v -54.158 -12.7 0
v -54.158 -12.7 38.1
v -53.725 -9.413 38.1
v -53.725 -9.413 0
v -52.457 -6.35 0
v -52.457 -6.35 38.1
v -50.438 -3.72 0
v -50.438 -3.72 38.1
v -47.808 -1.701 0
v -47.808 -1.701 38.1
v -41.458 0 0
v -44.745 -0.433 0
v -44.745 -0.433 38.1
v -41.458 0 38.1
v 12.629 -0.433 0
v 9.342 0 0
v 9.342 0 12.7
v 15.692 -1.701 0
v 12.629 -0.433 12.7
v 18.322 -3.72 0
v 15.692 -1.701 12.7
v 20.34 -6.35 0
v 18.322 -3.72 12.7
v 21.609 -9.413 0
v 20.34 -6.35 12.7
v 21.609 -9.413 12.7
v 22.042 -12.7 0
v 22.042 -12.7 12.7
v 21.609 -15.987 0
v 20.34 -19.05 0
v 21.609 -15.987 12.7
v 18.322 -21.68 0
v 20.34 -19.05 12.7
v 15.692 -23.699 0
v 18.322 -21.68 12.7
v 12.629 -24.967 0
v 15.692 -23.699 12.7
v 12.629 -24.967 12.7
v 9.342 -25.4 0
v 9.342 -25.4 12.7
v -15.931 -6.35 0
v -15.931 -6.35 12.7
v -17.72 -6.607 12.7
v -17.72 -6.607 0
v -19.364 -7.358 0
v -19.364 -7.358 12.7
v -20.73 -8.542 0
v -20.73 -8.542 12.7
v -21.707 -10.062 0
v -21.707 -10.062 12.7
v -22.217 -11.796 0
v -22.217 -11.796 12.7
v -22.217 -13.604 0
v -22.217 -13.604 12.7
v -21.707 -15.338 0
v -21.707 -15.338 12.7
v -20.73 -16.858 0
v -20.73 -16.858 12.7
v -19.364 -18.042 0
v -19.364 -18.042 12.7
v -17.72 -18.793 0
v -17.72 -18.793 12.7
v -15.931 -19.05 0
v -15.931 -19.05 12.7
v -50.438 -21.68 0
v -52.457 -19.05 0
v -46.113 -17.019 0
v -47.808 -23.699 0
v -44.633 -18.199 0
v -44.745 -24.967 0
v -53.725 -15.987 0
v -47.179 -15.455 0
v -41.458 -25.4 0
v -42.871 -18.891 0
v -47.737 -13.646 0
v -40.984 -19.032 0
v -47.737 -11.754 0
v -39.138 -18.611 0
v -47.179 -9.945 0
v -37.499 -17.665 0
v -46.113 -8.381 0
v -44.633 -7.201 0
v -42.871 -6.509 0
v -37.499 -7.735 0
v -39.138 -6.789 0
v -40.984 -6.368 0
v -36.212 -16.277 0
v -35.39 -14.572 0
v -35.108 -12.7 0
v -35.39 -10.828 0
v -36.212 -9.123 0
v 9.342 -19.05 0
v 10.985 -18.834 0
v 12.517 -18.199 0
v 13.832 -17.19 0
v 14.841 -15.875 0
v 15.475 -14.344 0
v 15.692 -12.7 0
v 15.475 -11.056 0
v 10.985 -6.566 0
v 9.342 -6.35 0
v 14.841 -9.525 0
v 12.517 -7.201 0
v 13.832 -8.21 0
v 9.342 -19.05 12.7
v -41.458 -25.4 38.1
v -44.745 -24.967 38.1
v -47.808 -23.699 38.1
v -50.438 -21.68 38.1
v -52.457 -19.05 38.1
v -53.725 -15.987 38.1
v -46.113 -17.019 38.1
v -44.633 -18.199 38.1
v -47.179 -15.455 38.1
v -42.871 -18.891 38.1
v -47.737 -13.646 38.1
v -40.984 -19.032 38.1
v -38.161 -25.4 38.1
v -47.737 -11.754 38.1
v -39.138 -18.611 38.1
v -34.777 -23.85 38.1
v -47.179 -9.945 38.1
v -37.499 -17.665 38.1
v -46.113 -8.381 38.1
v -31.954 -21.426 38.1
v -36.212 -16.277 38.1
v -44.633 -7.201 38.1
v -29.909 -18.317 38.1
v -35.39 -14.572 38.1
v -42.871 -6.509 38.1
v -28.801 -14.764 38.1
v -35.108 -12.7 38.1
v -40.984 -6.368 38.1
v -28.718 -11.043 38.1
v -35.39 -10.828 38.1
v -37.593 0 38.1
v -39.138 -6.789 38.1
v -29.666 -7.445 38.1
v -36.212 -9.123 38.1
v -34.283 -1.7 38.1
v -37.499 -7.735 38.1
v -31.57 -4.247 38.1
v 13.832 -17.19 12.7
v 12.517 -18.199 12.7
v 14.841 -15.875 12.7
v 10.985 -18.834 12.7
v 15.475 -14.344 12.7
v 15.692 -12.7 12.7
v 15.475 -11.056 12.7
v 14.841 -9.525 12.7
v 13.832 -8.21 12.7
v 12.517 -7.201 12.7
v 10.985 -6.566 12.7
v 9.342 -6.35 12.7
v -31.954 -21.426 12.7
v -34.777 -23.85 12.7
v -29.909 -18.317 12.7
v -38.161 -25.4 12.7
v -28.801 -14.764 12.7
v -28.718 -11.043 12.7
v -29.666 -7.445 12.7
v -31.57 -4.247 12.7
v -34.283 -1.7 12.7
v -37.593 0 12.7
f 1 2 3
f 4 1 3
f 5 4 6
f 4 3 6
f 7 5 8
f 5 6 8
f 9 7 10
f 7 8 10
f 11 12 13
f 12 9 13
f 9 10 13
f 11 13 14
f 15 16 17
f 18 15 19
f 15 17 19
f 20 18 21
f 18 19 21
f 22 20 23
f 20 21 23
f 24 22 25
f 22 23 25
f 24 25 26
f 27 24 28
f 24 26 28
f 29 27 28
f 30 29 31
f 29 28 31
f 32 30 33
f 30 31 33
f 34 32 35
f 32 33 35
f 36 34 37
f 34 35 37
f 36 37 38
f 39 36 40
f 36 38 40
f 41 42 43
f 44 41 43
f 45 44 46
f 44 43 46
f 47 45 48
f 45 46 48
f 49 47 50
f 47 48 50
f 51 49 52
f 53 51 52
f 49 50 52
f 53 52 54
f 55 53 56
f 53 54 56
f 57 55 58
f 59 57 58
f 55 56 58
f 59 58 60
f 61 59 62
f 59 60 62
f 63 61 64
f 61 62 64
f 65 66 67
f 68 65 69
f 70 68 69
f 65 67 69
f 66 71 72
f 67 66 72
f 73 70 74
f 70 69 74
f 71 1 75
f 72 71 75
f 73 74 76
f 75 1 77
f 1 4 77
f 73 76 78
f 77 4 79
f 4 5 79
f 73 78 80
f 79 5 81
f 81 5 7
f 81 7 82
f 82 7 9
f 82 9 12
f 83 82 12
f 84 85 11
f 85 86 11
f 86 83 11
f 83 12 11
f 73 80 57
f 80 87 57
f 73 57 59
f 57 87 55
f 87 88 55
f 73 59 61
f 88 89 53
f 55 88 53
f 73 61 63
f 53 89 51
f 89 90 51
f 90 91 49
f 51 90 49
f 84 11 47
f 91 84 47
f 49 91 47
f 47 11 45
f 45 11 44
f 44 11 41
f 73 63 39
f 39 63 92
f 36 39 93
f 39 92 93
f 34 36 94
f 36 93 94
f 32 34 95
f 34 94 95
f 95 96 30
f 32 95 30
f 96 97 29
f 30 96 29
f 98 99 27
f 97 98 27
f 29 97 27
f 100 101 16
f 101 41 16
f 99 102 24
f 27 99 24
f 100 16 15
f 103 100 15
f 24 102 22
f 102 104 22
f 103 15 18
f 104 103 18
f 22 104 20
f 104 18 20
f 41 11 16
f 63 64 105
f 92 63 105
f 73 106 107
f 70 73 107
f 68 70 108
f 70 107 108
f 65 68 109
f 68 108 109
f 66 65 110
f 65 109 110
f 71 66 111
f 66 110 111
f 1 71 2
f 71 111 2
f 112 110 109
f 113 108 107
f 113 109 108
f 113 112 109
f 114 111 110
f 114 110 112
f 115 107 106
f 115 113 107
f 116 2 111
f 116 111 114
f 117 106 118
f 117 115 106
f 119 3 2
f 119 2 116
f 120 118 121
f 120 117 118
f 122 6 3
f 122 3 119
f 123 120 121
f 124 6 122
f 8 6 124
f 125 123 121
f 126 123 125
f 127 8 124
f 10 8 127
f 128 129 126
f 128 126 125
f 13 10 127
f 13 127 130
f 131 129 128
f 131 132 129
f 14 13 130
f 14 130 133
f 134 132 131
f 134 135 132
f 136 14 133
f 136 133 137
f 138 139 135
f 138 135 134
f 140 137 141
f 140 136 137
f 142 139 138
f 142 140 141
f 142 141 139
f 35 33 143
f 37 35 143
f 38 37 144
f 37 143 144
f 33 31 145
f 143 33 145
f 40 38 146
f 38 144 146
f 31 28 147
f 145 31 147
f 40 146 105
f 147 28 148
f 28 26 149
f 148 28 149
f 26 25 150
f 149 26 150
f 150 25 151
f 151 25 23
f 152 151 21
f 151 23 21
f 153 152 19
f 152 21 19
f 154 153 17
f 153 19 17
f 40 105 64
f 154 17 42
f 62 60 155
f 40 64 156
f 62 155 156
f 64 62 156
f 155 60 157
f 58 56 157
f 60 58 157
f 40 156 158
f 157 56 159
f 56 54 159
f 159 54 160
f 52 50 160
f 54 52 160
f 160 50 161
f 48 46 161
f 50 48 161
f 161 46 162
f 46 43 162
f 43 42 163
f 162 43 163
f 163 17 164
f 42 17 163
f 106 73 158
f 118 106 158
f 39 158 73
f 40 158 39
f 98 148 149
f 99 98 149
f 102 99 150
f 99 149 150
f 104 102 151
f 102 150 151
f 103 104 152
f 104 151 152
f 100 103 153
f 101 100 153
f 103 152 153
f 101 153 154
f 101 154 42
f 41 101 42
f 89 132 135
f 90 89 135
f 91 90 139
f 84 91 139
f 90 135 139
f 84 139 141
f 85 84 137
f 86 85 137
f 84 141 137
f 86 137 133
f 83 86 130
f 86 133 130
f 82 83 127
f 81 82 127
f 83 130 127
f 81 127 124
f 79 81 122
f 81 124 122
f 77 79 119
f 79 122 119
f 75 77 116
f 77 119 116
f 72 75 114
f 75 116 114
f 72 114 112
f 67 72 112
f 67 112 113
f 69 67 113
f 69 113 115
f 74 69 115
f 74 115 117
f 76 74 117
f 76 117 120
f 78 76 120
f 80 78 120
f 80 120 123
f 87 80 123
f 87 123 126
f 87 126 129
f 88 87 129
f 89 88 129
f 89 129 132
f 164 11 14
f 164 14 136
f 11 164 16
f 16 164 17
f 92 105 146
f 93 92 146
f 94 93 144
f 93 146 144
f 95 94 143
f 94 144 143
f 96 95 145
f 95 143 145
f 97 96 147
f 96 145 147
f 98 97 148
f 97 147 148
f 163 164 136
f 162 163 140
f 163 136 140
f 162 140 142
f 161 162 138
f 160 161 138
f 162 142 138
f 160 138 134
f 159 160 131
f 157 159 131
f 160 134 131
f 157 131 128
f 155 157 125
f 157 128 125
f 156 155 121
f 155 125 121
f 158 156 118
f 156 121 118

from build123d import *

# Parameters (mm, degrees)
F1_DEPTH = 25.4
F3_DEPTH = 25.4
F4_R     = 6.35
F5_DEPTH = 127
F7_DEPTH = 25.4
F9_DEPTH = 25.4


# Not quite as in the source:
# - a feature names something its author has since deleted; it is built from what else it names


with BuildPart() as f1:
    # F0 (on Front) → F1 (new body)
    with BuildSketch(Plane.XZ):
        Polygon((-28.758216656, 38.1), (-54.158216656, 38.1), (-54.158216656, 0), (22.041783344, 0), (22.041783344, 12.7), (-28.758216656, 12.7), align=None)
    extrude(amount=F1_DEPTH)

    # F2 (on face) → F3 (join)
    with BuildSketch(Plane.XY.offset(12.7)):
        with BuildLine():
            Line((-28.758216656, 0), (-28.758216656, -25.4))
            ThreePointArc((-28.758216656, -25.4), (-23.817550475, -12.7), (-28.758216656, 0))
        make_face()
    extrude(amount=F3_DEPTH)

    # F4 (on face) → F5 (cut)
    with BuildSketch(Plane.XY.offset(38.1)):
        with BuildLine():
            ThreePointArc((-54.158216656, -12.7), (-50.438472777, -3.7197438789), (-41.458216656, 0))
            Line((-41.458216656, 0), (-54.158216656, 0))
            Line((-54.158216656, 0), (-54.158216656, -12.7))
        make_face()
        with BuildLine():
            Line((-54.158216656, -25.4), (-41.458216656, -25.4))
            ThreePointArc((-41.458216656, -25.4), (-50.438472777, -21.6802561211), (-54.158216656, -12.7))
            Line((-54.158216656, -12.7), (-54.158216656, -25.4))
        make_face()
        with Locations((-41.458216656, -12.7)):
            Circle(F4_R)
    extrude(amount=-F5_DEPTH, mode=Mode.SUBTRACT)

    # F6 (on face) → F7 (cut)
    with BuildSketch(Plane.XY.offset(38.1)):
        with BuildLine():
            ThreePointArc((-37.5933498144, 0), (-28.6296169388, -12.9065923281), (-38.1607972085, -25.4))
            Line((-38.1607972085, -25.4), (-28.758216656, -25.4))
            ThreePointArc((-28.758216656, -25.4), (-23.817550475, -12.7), (-28.758216656, 0))
            Line((-28.758216656, 0), (-37.5933498144, 0))
        make_face()
    extrude(amount=-F7_DEPTH, mode=Mode.SUBTRACT)

    # F8 (on face) → F9 (cut)
    with BuildSketch(Plane.XY.offset(12.7)):
        with BuildLine():
            ThreePointArc((15.691783344, -12.7), (13.8319114046, -8.2098719395), (9.341783344, -6.35))
            ThreePointArc((9.341783344, -6.35), (2.991783344, -12.7), (9.341783344, -19.05))
            ThreePointArc((9.341783344, -19.05), (13.8319114046, -17.1901280605), (15.691783344, -12.7))
        make_face()
        with BuildLine():
            ThreePointArc((-15.9312973803, -6.35), (-11.4411693197, -8.2098719395), (-9.5812973803, -12.7))
            ThreePointArc((-9.5812973803, -12.7), (-11.4411693197, -17.1901280605), (-15.9312973803, -19.05))
            Line((-15.9312973803, -19.05), (9.341783344, -19.05))
            ThreePointArc((9.341783344, -19.05), (2.991783344, -12.7), (9.341783344, -6.35))
            Line((9.341783344, -6.35), (-15.9312973803, -6.35))
        make_face()
        with BuildLine():
            ThreePointArc((-15.9312973803, -19.05), (-11.4411693197, -17.1901280605), (-9.5812973803, -12.7))
            ThreePointArc((-9.5812973803, -12.7), (-11.4411693197, -8.2098719395), (-15.9312973803, -6.35))
            ThreePointArc((-15.9312973803, -6.35), (-22.2812973803, -12.7), (-15.9312973803, -19.05))
        make_face()
        with BuildLine():
            ThreePointArc((9.341783344, 0), (18.3220394651, -3.7197438789), (22.041783344, -12.7))
            Line((22.041783344, -12.7), (22.041783344, 0))
            Line((22.041783344, 0), (9.341783344, 0))
        make_face()
        with BuildLine():
            ThreePointArc((22.041783344, -12.7), (18.3220394651, -21.6802561211), (9.341783344, -25.4))
            Line((9.341783344, -25.4), (22.041783344, -25.4))
            Line((22.041783344, -25.4), (22.041783344, -12.7))
        make_face()
    extrude(amount=-F9_DEPTH, mode=Mode.SUBTRACT)


solid = f1.part
